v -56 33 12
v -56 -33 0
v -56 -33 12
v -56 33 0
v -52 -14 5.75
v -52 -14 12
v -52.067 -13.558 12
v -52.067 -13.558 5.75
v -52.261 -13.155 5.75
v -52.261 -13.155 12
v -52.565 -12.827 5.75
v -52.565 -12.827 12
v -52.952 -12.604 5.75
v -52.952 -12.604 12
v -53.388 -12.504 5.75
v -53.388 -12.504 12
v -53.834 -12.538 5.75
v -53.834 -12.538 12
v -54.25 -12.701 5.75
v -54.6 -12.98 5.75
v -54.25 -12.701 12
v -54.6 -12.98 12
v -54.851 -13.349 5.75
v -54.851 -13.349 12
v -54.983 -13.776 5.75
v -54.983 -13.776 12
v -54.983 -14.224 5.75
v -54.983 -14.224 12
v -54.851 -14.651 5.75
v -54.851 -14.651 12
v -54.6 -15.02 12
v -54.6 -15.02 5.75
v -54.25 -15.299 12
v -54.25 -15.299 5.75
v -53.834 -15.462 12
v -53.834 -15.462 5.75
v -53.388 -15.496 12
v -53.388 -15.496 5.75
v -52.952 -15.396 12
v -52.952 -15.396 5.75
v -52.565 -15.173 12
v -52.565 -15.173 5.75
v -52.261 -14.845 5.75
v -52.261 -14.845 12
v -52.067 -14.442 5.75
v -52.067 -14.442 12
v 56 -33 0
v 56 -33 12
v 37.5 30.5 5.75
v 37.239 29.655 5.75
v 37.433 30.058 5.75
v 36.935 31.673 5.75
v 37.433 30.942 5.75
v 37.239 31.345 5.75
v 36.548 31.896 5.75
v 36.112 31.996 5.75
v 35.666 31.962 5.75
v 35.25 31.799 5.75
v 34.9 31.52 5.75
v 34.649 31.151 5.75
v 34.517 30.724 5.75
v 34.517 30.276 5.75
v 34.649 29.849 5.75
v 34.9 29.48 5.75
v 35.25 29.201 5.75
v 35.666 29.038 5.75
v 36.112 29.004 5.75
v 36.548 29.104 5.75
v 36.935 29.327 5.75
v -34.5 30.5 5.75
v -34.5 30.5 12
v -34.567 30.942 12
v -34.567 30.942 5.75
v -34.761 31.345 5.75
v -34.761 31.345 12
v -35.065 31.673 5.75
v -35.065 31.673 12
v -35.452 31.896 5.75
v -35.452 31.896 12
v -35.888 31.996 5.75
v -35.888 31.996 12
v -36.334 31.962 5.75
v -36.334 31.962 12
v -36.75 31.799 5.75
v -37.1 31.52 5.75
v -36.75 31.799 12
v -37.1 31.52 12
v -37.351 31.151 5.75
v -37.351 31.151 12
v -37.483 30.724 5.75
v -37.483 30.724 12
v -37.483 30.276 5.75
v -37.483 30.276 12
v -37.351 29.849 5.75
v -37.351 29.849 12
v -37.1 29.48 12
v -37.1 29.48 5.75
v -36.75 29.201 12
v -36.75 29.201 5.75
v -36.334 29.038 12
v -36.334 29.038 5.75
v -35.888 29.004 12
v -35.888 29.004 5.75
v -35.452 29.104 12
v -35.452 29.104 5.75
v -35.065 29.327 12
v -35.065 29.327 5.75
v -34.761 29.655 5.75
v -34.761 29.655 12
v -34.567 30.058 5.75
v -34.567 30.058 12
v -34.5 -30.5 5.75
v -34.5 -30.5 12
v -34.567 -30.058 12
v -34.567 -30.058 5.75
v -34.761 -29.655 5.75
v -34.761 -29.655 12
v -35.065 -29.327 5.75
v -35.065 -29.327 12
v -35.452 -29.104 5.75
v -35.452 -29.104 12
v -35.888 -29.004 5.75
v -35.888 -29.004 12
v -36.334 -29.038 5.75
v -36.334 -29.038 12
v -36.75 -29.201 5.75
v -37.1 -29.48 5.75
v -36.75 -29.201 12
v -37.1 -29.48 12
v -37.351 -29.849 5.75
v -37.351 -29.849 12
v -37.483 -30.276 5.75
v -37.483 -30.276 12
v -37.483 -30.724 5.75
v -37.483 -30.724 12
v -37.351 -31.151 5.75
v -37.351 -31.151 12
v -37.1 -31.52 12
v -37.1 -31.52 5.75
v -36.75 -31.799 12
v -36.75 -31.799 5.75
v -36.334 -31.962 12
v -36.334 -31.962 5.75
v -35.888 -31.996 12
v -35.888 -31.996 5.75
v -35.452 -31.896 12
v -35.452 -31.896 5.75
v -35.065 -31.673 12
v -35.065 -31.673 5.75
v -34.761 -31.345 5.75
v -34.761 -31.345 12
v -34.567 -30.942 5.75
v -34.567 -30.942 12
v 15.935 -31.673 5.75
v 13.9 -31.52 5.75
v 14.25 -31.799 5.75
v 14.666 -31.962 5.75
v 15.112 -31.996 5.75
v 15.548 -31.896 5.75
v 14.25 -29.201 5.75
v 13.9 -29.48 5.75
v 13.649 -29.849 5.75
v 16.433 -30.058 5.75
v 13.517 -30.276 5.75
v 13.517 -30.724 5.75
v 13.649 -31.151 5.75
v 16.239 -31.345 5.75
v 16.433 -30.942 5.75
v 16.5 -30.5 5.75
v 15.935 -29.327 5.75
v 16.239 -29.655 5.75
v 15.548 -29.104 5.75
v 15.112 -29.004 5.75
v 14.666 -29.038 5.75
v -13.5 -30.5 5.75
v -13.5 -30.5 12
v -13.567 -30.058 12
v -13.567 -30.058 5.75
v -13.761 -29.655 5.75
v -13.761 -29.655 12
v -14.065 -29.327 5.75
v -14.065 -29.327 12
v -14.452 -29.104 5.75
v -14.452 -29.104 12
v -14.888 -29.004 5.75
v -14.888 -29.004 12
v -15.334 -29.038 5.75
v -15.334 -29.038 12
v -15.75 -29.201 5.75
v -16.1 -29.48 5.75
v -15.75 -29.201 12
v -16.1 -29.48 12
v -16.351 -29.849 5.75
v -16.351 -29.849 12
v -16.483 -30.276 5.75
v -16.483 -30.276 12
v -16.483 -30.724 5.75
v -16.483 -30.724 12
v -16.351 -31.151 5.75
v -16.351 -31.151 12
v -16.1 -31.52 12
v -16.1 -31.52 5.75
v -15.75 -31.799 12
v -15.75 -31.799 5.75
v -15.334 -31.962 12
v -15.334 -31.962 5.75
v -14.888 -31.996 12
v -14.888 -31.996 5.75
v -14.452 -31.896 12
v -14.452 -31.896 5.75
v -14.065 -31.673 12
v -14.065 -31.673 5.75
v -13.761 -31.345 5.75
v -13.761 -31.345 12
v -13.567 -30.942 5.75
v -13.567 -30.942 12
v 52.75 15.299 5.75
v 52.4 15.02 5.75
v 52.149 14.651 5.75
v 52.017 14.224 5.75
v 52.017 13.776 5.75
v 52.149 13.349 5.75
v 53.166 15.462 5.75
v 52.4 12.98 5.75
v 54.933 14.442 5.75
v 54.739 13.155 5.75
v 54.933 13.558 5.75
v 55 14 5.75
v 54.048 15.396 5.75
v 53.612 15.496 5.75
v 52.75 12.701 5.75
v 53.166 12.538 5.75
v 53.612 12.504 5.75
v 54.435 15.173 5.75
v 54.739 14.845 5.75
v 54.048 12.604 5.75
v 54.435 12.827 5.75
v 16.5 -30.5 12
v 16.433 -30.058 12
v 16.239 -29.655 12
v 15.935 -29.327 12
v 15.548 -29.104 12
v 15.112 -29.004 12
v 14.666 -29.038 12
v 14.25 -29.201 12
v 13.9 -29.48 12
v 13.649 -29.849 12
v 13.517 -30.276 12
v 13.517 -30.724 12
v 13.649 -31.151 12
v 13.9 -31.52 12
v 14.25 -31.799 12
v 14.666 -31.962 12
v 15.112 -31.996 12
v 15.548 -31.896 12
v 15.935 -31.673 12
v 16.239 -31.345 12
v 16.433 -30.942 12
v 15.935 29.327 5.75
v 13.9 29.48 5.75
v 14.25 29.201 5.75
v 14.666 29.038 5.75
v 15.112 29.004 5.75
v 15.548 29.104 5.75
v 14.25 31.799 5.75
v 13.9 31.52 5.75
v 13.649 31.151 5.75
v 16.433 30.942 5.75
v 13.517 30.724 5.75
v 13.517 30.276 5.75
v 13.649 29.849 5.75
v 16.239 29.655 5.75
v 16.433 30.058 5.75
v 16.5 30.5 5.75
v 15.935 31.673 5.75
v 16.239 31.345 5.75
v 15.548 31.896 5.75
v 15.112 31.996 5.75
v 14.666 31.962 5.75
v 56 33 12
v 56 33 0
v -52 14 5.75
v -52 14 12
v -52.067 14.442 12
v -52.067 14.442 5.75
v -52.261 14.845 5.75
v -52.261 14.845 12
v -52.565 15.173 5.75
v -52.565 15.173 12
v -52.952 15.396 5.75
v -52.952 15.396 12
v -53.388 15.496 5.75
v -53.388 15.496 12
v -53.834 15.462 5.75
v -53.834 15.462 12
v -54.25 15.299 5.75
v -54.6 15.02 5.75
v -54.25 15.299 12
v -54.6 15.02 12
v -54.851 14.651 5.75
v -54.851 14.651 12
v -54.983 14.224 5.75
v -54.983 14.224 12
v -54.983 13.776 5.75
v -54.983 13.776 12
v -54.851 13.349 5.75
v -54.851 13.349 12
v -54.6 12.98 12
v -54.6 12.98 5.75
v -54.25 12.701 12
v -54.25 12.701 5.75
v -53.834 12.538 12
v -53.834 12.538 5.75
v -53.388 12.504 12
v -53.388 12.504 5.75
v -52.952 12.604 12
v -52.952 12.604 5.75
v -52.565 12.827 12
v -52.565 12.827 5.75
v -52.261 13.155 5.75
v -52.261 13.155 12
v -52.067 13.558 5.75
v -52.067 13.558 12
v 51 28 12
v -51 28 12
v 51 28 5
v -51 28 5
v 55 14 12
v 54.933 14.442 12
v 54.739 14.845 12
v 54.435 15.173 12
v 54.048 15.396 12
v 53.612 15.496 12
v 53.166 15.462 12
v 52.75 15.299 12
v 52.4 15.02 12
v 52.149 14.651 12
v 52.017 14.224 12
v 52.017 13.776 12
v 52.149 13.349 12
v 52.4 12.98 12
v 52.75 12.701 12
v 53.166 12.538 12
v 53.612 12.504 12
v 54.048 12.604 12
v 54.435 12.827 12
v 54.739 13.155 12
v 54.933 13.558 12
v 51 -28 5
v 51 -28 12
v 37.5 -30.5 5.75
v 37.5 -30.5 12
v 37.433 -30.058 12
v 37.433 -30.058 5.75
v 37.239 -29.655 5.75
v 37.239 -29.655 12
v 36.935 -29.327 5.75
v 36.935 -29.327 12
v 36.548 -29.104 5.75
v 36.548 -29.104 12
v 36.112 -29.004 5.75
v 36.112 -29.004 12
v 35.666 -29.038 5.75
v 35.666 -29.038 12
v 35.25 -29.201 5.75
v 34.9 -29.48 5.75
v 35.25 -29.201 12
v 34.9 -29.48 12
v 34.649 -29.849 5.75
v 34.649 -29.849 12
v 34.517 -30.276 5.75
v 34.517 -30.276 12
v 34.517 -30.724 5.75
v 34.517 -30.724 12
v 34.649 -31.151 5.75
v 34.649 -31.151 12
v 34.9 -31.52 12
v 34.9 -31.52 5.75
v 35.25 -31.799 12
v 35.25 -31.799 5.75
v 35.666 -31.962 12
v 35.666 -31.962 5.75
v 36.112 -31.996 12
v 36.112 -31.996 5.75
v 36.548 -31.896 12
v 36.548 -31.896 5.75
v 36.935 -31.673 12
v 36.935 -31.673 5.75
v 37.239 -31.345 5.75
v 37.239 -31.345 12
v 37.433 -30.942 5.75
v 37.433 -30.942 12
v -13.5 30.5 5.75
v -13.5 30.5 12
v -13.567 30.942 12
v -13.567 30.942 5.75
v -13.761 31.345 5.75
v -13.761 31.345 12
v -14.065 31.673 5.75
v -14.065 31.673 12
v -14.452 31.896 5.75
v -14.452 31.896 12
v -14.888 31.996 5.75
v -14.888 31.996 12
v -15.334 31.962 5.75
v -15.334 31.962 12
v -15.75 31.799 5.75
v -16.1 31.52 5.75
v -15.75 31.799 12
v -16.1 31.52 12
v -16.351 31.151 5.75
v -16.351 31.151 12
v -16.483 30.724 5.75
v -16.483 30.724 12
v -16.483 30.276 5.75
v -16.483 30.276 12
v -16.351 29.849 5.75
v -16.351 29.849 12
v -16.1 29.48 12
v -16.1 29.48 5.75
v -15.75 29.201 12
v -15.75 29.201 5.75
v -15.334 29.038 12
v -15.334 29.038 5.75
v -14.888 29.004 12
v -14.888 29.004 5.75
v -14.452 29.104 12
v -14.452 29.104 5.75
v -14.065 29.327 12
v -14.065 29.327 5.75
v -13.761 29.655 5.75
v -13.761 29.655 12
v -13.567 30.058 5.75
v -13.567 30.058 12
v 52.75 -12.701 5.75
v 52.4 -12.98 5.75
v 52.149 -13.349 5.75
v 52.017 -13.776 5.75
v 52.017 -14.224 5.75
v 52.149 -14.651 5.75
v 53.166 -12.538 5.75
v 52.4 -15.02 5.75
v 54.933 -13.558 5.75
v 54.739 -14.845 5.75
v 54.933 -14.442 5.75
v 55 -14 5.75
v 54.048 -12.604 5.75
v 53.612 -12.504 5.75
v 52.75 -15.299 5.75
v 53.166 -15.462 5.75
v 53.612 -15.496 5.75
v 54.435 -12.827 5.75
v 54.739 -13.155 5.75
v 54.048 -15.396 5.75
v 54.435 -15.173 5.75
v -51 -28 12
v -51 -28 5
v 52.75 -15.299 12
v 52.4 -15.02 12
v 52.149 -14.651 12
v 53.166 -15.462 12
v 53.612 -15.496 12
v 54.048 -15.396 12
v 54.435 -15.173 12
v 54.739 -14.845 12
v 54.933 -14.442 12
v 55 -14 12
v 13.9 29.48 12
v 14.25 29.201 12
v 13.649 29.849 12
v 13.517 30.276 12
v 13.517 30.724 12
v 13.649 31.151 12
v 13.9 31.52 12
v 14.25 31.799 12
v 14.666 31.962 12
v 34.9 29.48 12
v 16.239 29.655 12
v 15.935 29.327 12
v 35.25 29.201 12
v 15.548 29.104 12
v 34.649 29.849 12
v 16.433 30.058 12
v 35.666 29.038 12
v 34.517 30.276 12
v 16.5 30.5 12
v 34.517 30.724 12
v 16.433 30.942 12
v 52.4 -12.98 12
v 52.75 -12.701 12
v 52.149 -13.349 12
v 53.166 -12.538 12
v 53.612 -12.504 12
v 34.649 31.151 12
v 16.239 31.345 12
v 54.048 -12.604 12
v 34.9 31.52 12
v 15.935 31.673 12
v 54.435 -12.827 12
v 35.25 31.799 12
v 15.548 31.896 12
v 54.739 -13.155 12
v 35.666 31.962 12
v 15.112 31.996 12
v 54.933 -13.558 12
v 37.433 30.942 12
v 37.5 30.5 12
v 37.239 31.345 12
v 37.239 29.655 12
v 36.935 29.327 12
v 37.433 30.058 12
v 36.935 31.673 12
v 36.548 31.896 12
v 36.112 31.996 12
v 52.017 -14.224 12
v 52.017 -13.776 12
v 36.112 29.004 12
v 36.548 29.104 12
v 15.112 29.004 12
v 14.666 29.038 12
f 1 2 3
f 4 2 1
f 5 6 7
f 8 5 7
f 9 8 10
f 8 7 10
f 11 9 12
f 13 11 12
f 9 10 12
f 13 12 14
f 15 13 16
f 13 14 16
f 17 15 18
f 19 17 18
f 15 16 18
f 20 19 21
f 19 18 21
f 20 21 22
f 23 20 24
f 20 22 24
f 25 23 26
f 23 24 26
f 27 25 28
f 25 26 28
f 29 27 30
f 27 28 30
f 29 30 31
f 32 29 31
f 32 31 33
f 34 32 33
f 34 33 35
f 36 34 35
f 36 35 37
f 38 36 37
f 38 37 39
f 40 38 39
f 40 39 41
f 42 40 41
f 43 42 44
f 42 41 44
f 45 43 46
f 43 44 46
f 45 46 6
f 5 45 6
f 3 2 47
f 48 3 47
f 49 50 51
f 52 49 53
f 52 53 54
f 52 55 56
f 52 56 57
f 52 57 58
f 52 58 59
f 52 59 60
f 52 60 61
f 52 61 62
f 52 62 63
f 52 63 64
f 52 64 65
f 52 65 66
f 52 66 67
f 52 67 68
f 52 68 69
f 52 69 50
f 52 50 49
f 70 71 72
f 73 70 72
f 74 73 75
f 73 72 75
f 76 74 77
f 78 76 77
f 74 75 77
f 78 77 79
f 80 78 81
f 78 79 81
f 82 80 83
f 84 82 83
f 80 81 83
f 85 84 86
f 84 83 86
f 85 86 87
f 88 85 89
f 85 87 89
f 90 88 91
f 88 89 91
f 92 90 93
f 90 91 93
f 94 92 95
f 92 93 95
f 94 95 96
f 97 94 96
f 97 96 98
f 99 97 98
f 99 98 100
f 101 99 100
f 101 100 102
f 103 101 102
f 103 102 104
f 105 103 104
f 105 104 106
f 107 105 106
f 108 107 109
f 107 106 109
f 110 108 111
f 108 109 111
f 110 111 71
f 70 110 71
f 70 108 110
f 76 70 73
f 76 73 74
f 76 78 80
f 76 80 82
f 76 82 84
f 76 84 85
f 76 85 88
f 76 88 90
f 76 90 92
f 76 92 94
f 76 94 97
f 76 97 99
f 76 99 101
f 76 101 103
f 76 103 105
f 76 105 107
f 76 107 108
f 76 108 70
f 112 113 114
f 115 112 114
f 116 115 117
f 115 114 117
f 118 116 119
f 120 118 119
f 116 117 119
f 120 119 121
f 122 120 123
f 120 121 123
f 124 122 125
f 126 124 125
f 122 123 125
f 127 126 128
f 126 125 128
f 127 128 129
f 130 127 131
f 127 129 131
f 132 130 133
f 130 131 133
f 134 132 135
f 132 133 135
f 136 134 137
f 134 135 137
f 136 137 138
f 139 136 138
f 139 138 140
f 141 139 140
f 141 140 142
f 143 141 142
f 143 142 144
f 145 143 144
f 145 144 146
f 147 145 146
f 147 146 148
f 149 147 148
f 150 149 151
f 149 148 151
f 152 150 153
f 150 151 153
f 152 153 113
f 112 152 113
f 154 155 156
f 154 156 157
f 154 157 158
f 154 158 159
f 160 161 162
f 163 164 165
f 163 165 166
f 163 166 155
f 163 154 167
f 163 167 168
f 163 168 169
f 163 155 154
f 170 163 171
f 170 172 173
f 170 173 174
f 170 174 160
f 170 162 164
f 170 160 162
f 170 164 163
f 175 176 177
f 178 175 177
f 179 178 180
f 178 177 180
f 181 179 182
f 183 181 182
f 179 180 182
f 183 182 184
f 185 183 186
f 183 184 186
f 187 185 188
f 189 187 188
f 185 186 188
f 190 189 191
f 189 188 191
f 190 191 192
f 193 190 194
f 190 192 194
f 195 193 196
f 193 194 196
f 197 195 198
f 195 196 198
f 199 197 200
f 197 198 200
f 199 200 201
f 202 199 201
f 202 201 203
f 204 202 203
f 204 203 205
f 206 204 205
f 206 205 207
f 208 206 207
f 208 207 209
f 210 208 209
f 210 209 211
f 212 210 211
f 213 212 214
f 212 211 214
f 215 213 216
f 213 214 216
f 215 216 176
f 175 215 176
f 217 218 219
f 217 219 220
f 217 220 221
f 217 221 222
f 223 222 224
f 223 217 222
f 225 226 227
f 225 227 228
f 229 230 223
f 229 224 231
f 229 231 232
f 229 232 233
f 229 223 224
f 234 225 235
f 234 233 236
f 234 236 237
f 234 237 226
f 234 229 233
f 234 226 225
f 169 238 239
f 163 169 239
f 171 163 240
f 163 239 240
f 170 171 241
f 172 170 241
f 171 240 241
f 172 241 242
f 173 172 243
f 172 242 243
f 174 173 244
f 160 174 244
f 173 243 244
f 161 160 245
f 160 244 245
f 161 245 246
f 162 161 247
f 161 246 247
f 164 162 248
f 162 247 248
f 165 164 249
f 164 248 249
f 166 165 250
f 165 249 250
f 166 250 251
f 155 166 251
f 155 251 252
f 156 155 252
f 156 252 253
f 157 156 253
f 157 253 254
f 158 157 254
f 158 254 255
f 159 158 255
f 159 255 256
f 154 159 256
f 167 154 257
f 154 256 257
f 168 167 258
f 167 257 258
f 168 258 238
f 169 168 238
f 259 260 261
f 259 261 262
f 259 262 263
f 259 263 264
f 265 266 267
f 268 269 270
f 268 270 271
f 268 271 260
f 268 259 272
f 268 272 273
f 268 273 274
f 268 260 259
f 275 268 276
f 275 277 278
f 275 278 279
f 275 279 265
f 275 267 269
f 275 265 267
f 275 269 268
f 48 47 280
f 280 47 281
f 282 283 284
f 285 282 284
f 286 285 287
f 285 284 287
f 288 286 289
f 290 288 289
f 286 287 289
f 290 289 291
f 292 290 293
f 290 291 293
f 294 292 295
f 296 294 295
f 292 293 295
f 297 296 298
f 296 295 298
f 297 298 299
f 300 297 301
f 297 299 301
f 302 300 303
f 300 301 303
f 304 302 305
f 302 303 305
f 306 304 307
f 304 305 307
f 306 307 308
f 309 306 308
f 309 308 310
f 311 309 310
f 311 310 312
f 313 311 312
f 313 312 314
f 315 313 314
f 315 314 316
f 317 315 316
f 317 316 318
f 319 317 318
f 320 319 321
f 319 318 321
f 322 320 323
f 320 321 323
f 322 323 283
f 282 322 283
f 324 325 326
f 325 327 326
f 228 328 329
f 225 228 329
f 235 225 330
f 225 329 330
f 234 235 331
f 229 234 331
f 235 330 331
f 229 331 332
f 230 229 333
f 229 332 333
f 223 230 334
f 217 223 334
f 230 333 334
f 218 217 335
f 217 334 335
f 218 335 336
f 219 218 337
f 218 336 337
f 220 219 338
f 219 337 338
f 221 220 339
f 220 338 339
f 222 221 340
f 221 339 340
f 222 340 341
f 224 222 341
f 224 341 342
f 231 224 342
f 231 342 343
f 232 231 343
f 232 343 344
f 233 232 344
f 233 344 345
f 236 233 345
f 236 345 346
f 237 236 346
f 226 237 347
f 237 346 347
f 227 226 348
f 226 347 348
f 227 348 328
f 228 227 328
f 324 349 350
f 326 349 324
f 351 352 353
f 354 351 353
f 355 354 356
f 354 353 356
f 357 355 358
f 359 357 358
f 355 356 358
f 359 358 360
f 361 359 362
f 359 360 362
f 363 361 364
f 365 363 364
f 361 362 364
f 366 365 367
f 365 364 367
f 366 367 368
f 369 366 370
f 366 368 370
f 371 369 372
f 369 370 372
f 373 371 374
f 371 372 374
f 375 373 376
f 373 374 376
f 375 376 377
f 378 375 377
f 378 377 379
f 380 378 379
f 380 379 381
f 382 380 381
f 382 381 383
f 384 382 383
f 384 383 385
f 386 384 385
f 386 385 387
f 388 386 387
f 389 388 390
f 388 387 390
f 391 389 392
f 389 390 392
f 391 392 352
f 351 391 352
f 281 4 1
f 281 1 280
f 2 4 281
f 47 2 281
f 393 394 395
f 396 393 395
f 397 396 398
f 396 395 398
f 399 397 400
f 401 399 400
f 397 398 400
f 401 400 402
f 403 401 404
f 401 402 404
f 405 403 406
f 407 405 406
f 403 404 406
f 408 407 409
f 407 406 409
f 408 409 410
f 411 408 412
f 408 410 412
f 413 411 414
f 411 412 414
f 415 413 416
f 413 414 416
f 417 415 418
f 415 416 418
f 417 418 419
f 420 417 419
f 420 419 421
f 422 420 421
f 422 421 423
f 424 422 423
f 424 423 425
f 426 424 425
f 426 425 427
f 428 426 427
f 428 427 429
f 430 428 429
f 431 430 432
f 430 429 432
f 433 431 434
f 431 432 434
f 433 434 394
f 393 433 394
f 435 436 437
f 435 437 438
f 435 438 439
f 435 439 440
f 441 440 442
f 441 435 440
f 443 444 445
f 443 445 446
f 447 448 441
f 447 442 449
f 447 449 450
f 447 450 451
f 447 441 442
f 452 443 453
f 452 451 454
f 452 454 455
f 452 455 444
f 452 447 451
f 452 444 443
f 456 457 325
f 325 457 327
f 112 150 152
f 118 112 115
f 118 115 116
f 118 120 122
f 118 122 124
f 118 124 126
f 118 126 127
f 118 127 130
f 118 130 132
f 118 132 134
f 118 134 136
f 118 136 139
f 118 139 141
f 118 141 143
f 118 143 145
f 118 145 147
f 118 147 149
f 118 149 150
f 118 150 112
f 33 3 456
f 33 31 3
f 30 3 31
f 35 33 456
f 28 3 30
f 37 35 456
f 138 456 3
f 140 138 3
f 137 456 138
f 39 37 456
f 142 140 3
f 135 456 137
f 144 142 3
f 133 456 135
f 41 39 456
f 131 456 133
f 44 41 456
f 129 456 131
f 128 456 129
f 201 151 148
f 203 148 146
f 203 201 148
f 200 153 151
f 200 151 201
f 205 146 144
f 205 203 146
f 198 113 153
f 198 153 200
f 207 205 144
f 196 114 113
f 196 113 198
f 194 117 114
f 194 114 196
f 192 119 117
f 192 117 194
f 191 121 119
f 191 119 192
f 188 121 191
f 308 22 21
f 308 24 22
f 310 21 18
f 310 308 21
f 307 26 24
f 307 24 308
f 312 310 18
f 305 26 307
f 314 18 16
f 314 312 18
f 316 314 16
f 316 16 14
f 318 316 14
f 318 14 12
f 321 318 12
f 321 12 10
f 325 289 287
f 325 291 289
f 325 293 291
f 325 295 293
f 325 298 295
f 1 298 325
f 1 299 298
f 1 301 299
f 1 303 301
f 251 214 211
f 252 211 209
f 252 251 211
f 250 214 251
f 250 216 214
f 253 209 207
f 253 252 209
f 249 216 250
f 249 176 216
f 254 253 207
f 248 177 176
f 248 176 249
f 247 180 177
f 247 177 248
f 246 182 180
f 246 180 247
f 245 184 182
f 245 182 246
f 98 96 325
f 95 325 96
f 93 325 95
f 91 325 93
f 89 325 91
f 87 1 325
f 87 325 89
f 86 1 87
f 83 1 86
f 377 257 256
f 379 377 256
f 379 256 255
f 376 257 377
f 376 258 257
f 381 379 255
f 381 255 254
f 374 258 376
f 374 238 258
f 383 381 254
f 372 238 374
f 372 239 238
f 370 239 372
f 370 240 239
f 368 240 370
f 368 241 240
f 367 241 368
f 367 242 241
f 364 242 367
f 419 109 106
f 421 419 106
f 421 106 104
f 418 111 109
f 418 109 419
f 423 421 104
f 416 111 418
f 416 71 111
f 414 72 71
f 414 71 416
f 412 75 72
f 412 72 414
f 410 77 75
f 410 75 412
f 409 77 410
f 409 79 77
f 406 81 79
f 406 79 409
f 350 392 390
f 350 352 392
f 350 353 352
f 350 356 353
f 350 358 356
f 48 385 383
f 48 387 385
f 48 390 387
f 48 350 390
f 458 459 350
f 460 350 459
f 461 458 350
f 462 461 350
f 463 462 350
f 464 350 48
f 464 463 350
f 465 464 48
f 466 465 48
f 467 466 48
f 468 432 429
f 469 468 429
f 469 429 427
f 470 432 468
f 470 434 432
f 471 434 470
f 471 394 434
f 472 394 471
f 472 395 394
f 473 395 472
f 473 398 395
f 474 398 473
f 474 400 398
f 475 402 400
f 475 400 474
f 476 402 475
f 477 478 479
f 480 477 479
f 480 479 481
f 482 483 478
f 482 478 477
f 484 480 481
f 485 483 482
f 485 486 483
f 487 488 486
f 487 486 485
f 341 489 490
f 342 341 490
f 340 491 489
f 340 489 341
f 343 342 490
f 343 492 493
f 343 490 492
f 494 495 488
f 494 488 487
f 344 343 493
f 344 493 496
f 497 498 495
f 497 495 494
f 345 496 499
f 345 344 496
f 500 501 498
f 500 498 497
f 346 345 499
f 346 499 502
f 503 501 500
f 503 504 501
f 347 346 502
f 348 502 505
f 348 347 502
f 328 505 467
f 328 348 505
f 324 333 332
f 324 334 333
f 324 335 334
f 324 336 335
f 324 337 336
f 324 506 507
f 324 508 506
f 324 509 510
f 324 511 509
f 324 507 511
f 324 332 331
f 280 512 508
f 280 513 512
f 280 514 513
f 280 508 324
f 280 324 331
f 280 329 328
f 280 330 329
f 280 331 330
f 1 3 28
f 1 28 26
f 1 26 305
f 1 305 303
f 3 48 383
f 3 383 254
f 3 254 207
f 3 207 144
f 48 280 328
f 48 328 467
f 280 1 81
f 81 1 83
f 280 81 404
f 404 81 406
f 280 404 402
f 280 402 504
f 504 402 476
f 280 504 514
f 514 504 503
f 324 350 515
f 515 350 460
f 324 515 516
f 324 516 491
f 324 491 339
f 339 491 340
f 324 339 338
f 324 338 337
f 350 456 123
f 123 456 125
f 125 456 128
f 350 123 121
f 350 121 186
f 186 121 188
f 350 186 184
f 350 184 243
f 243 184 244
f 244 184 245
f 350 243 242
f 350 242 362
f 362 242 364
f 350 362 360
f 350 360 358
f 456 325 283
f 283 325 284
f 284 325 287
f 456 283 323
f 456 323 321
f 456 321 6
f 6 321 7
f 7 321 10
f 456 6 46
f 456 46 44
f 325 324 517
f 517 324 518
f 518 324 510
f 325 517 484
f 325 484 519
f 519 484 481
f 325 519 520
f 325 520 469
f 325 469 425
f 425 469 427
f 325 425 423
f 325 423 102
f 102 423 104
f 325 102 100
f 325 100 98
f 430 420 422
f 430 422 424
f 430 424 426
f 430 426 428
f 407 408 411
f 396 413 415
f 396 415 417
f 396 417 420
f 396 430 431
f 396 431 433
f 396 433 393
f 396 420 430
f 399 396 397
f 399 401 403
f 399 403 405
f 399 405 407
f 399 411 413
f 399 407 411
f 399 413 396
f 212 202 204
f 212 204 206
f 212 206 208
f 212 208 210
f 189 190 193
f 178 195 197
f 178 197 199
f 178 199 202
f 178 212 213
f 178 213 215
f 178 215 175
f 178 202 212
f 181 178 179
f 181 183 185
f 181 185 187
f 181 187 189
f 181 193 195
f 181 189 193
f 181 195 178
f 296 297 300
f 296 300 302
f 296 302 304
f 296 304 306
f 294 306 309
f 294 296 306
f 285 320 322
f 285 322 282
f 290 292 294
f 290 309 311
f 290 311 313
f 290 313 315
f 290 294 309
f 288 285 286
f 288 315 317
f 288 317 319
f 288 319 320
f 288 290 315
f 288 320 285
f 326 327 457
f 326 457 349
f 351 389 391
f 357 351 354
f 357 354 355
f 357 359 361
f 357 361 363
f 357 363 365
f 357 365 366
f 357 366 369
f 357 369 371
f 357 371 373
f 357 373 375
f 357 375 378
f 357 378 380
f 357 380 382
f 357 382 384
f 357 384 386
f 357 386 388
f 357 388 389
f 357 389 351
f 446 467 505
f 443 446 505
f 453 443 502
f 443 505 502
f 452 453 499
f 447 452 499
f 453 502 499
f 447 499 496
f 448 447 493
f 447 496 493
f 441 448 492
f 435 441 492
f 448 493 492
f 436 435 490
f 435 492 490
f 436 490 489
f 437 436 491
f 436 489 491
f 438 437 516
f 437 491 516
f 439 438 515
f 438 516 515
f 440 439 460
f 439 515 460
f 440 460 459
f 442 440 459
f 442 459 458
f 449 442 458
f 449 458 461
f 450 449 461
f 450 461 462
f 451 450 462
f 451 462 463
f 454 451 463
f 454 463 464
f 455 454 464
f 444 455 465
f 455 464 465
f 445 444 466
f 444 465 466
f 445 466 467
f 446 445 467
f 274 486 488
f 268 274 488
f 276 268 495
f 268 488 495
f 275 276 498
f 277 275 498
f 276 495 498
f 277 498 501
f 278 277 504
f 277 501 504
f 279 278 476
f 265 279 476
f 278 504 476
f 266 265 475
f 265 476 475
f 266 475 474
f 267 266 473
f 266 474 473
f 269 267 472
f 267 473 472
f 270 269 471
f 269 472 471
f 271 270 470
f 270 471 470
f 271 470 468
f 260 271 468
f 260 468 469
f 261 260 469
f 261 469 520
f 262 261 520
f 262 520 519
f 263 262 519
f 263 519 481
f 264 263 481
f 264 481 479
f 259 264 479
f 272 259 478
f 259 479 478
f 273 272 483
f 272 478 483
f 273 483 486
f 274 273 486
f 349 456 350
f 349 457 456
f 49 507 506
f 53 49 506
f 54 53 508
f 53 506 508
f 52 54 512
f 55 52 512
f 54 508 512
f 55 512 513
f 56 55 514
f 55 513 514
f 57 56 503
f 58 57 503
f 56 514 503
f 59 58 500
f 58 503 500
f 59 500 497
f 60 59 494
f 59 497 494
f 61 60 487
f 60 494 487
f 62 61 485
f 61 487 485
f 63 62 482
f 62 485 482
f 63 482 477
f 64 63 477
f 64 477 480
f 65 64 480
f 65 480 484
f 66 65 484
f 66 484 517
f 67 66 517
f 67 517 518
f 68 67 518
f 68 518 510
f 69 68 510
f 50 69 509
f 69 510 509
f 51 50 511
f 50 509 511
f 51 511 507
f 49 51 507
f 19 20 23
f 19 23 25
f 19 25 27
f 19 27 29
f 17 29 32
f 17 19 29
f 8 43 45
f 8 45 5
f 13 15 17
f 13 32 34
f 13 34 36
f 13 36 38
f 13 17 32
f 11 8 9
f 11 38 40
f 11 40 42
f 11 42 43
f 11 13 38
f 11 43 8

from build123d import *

# Parameters (mm, degrees)
F0_W     = 112
F0_H     = 66
F1_DEPTH = 12
F2_T     = -5
F3_R     = 1.5
F4_DEPTH = 6.25


with BuildPart() as f1:
    # F0 (on Top) → F1 (new body)
    with BuildSketch(Plane.XY):
        Rectangle(F0_W, F0_H)
    extrude(amount=F1_DEPTH)

    # F2
    f2_openings = [f1.faces().sort_by_distance(p)[0] for p in [
        (0, 0, 12),
    ]]
    offset(amount=F2_T, openings=f2_openings)

    # F3 (on face) → F4 (cut)
    with BuildSketch(Plane.XY.offset(12)):
        with Locations((-53.5, 14)):
            Circle(F3_R)
        with Locations((-53.5, -14)):
            Circle(F3_R)
        with Locations((-36, 30.5)):
            Circle(F3_R)
        with Locations((-15, 30.5)):
            Circle(F3_R)
        with Locations((15, 30.5)):
            Circle(F3_R)
        with Locations((36, 30.5)):
            Circle(F3_R)
        with Locations((53.5, 14)):
            Circle(F3_R)
        with Locations((53.5, -14)):
            Circle(F3_R)
        with Locations((36, -30.5)):
            Circle(F3_R)
        with Locations((15, -30.5)):
            Circle(F3_R)
        with Locations((-15, -30.5)):
            Circle(F3_R)
        with Locations((-36, -30.5)):
            Circle(F3_R)
    extrude(amount=-F4_DEPTH, mode=Mode.SUBTRACT)


solid = f1.part
